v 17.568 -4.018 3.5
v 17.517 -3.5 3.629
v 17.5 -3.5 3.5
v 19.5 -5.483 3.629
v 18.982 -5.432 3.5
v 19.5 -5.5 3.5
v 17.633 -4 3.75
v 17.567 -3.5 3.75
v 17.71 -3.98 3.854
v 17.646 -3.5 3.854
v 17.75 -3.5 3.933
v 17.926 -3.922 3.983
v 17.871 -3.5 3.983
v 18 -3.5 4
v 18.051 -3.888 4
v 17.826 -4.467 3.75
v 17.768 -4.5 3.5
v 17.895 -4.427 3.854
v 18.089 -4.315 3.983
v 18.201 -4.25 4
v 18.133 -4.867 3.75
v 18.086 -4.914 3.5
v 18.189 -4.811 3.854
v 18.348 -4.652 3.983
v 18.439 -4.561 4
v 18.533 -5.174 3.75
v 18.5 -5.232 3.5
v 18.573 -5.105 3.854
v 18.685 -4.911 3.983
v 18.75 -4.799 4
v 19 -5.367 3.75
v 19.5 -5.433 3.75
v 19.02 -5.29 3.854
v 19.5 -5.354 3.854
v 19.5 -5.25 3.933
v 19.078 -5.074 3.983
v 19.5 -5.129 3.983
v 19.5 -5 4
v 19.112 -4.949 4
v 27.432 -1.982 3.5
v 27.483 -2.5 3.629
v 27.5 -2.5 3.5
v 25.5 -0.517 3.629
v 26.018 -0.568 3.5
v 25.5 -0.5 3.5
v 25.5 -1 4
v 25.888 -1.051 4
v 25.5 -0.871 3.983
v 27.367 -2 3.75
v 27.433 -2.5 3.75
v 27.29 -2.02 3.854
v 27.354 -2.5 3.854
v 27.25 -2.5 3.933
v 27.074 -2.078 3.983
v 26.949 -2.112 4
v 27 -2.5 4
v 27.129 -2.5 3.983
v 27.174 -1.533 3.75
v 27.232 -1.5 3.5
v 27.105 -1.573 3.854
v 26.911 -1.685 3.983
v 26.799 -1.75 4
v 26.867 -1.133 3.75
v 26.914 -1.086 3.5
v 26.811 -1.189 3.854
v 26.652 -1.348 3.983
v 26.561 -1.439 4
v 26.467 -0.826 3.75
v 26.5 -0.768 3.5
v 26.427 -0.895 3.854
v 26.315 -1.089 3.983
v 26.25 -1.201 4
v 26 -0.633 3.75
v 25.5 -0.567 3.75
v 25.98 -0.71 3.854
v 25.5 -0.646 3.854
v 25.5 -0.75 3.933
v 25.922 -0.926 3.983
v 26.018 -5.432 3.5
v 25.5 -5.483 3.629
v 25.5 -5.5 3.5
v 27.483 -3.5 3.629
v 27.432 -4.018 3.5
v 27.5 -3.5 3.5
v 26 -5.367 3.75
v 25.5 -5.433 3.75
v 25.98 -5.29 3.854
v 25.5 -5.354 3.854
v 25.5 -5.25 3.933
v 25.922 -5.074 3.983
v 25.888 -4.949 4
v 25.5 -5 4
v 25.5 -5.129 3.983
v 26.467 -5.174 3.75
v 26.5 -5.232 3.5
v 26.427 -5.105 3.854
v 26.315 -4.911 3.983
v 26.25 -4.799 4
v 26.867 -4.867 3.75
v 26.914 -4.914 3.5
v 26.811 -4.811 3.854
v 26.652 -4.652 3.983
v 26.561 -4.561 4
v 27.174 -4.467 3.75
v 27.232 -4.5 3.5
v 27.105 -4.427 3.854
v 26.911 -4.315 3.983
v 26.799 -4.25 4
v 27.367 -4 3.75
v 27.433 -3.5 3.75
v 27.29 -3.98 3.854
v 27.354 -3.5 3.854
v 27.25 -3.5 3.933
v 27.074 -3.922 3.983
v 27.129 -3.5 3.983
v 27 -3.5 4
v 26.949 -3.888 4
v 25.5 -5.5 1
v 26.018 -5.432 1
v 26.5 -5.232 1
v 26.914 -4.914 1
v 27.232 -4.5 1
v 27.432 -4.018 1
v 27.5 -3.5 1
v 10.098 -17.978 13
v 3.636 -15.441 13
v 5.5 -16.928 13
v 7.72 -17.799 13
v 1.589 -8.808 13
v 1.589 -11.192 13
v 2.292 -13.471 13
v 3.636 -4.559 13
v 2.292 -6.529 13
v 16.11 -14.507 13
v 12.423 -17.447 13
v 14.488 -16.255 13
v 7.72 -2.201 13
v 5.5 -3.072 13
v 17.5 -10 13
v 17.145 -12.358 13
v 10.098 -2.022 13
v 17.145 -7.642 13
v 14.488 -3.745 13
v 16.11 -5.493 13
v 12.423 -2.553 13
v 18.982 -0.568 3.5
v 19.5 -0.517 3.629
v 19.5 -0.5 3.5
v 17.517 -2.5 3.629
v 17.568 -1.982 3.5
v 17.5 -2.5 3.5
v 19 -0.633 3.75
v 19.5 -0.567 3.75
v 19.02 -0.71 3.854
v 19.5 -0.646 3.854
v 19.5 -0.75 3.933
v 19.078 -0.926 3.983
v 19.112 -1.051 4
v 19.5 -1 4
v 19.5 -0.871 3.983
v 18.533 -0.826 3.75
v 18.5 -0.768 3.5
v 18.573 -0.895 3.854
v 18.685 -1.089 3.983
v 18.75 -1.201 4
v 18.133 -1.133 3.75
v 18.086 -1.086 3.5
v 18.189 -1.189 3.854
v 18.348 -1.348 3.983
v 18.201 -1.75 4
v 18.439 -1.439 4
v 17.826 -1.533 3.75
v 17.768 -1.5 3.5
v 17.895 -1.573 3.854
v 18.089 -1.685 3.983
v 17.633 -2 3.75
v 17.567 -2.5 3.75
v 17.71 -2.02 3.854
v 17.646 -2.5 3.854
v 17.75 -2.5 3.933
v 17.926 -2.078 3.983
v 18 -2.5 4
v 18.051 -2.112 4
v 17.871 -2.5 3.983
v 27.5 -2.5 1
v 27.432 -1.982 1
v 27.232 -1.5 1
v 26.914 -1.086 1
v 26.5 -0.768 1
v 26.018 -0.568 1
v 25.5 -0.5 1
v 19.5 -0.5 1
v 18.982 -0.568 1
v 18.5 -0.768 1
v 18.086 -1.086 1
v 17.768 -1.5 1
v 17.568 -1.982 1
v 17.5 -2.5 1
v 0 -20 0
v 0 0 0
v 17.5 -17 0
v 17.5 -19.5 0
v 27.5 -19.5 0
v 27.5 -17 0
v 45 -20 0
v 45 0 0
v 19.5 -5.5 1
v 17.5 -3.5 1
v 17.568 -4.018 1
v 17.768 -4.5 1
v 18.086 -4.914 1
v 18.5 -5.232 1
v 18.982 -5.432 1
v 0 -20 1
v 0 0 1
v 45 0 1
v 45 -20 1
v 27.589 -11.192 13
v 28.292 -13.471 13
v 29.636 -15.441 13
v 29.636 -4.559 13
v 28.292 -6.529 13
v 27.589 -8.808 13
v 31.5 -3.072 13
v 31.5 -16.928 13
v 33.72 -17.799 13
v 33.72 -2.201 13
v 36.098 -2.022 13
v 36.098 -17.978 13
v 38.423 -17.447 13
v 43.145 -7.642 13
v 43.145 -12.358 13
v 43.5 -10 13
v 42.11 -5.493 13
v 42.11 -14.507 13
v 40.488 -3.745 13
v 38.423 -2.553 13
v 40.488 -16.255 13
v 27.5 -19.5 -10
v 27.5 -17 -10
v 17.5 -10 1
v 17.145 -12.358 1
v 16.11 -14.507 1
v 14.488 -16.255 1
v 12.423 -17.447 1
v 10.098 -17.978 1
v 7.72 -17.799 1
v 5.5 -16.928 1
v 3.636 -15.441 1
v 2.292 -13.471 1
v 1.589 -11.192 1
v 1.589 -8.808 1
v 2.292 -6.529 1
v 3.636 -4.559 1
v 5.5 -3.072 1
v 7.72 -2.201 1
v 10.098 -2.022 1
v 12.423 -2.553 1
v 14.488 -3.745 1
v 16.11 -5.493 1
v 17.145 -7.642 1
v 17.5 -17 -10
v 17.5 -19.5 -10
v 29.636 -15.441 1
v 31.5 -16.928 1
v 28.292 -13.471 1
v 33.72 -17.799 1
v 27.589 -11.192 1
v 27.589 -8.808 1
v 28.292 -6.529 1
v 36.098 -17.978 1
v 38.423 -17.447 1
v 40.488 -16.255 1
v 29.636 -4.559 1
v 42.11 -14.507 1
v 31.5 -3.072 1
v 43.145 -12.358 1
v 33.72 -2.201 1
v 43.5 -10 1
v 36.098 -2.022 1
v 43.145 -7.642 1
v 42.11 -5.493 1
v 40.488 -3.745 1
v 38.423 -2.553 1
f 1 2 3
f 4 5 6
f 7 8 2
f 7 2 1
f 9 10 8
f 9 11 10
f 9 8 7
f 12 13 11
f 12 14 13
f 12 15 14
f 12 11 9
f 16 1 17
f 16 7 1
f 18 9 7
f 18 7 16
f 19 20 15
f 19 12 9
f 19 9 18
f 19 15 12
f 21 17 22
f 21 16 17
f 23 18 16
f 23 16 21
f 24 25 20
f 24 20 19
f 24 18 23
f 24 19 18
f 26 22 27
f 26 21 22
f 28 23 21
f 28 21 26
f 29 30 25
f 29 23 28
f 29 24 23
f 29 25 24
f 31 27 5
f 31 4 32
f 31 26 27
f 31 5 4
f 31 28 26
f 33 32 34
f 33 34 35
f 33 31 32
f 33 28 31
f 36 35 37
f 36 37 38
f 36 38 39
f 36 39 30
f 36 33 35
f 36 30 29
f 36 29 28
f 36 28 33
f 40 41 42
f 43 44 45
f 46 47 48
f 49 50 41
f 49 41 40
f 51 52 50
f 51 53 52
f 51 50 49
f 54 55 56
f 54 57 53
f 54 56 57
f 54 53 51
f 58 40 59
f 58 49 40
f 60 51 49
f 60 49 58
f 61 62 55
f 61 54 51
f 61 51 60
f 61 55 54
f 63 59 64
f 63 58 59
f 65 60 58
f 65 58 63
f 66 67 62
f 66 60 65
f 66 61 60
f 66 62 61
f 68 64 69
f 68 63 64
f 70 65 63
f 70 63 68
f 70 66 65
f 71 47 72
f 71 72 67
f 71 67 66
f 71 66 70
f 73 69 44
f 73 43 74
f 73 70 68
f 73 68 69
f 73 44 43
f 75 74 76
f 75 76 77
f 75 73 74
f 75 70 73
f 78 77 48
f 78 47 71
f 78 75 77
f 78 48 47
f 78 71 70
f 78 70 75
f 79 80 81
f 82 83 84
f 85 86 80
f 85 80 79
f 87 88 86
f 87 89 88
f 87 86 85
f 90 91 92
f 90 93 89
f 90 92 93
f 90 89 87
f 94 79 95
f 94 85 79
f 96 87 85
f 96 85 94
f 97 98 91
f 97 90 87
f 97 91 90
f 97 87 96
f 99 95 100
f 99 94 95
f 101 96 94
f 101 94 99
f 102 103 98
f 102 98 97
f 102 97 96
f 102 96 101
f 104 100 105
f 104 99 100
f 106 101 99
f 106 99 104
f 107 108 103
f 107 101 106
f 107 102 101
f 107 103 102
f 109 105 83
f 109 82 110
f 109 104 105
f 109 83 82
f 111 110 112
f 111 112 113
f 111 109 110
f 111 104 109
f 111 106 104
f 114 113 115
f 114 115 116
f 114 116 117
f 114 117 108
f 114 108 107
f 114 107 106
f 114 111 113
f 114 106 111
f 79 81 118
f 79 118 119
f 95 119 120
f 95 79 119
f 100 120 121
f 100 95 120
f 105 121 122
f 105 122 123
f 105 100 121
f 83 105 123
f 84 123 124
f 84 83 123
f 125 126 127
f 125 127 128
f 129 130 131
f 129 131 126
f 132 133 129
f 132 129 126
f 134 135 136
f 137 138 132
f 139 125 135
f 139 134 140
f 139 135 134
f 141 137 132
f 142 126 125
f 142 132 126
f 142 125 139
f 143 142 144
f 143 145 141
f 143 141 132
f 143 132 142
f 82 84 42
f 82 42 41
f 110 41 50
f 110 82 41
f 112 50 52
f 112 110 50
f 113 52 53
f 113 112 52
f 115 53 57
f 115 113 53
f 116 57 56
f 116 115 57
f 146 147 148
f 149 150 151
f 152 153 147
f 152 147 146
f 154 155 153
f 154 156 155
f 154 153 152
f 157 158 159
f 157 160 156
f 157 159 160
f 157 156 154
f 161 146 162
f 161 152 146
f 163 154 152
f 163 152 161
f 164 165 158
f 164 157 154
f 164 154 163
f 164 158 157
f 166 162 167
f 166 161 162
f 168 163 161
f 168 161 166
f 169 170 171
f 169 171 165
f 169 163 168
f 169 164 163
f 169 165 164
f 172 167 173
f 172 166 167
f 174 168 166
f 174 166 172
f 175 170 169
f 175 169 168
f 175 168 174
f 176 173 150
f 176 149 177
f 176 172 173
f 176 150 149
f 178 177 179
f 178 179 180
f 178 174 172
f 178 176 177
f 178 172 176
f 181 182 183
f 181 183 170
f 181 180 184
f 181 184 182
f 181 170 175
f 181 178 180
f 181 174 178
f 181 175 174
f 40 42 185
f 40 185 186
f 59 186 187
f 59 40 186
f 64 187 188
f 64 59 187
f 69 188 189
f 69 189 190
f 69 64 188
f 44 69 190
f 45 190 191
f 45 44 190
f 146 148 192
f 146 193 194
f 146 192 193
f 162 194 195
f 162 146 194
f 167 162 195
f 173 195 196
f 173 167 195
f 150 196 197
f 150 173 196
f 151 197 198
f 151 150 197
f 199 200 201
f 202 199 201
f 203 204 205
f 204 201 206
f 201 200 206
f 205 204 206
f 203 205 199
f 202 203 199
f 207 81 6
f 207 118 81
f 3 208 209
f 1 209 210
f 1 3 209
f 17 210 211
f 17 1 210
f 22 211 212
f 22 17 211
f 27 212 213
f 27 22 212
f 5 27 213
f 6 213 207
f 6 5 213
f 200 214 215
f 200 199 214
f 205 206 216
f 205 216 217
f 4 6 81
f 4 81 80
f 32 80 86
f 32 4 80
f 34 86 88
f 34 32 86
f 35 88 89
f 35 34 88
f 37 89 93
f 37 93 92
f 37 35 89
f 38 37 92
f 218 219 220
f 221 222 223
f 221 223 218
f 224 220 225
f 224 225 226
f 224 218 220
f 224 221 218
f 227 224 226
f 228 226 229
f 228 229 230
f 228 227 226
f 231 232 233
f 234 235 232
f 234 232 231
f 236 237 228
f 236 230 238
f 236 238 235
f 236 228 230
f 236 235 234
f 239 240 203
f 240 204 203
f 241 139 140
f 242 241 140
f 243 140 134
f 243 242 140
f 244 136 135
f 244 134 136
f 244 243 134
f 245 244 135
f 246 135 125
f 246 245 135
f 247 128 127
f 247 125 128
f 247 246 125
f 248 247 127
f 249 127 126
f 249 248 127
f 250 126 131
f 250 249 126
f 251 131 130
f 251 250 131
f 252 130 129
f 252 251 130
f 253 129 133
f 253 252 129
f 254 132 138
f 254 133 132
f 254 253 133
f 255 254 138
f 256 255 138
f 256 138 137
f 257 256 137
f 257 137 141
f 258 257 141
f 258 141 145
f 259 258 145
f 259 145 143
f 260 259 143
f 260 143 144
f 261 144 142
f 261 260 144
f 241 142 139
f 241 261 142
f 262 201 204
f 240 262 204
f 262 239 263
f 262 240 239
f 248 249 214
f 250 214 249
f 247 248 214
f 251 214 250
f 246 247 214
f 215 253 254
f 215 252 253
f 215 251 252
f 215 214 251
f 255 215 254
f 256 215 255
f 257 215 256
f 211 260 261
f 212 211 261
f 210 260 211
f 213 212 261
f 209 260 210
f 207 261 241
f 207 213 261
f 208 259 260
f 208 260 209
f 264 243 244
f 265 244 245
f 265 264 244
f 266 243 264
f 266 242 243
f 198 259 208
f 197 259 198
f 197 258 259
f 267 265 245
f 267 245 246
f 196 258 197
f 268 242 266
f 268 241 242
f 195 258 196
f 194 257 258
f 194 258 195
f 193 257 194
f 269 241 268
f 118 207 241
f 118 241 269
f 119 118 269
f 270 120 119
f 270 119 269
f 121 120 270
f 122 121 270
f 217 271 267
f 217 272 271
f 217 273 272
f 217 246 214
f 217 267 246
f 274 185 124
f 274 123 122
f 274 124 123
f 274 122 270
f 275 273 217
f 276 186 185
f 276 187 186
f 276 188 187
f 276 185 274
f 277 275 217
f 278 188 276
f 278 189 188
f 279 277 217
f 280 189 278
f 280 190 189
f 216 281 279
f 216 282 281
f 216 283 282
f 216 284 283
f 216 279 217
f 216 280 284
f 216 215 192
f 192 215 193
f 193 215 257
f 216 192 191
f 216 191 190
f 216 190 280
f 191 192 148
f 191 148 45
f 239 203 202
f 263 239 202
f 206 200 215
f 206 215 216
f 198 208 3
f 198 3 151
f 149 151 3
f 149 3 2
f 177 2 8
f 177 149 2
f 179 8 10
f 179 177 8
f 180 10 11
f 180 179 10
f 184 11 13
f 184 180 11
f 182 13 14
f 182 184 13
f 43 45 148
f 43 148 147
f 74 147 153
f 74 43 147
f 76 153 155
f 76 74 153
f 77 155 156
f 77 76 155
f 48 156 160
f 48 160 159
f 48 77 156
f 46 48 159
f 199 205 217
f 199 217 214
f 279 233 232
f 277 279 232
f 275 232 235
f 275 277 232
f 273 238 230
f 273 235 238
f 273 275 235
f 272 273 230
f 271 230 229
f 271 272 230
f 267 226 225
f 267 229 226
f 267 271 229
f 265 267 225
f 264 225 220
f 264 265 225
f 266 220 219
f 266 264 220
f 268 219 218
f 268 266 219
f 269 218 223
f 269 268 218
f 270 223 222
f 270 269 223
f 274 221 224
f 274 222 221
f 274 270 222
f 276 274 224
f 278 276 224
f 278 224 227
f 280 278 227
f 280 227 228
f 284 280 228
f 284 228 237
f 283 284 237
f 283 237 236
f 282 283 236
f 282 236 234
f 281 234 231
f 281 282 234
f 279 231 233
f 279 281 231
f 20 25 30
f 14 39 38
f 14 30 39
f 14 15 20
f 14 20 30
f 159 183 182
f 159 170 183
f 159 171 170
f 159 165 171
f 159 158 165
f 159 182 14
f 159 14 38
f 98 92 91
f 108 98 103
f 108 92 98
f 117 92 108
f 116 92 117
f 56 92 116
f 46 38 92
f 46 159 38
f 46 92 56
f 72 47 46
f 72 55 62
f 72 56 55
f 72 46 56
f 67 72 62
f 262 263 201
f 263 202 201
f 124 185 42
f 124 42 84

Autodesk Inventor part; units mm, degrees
ref_plane "YZ Plane" through (0, 0, 0) normal (1, 0, 0) x (0, 1, 0)
ref_plane "XZ Plane" through (0, 0, 0) normal (0, 1, 0) x (-1, 0, 0)
ref_plane "XY Plane" through (0, 0, 0) normal (0, 0, 1) x (1, 0, 0)
sketch "Sketch1" plane through (0, 0, 0) normal (0, 0, 1) x (1, 0, 0)
  line L0 (0, 0) -> (45, 0)
  line L1 (45, 0) -> (45, -20)
  line L2 (45, -20) -> (0, -20)
  line L3 (0, -20) -> (0, 0)
  dimension "d0" = 45
  dimension "d1" = 20
extrude "Extrusion1" add sketch "Sketch1" along normal blind 1
sketch "Sketch2" plane through (0, 0, 1) normal (0, 0, 1) x (1, 0, 0)
  circle A0 centre (9.5, -10) radius 8
  circle A1 centre (35.5, -10) radius 8
  line L0 (0, -20) -> (45, -20) projected
  line L1 (0, 0) -> (0, -20) projected
  dimension "d4" = 16
  dimension "d5" = 16
  dimension "d6" = 26
  dimension "d7" = 10
  dimension "d8" = 9.5
extrude "Extrusion2" add sketch "Sketch2" along normal blind 12
sketch "Sketch3" plane through (0, 0, 1) normal (0, 0, 1) x (1, 0, 0)
  line L0 (17.5, -0.5) -> (27.5, -0.5)
  line L1 (27.5, -0.5) -> (27.5, -5.5)
  line L2 (27.5, -5.5) -> (17.5, -5.5)
  line L3 (17.5, -5.5) -> (17.5, -0.5)
  line L4 (0, 0) -> (0, -20) projected
  line L5 (45, 0) -> (0, 0) projected
  dimension "d11" = 10
  dimension "d12" = 5
  dimension "d13" = 17.5
  dimension "d14" = 0.5
extrude "Extrusion3" add sketch "Sketch3" along normal blind 3
fillet "Fillet1" radius 2 4 edges at (27.5, -0.5, 2.5) (27.5, -5.5, 2.5) (17.5, -0.5, 2.5) (17.5, -5.5, 2.5)
fillet "Fillet2" radius 0.5 8 edges at (17.5, -3, 4) (18.0858, -1.0858, 4) (22.5, -0.5, 4) (26.9142, -1.0858, 4) (27.5, -3, 4) (26.9142, -4.9142, 4) (22.5, -5.5, 4) (18.0858, -4.9142, 4)
sketch "Sketch4" plane through (0, 0, 0) normal (0, 0, -1) x (-1, 0, 0)
  point P0 (0, 0)
sketch "Sketch5" plane through (0, 0, 0) normal (0, 0, -1) x (-1, 0, 0)
  line L0 (0, -20) -> (-45, -20) projected
  line L1 (-27.5, -19.5) -> (-17.5, -19.5)
  line L2 (-17.5, -19.5) -> (-17.5, -17)
  line L3 (-17.5, -17) -> (-27.5, -17)
  line L4 (-27.5, -17) -> (-27.5, -19.5)
  line L5 (-45, -20) -> (-45, 0) projected
  point P0 (0, 0)
  point P1 (-17.5, -18.25)
  point P2 (-27.5, -18.25)
  point P3 (-17.5, -20)
  dimension "d20" = 10
  dimension "d21" = 17.5
  dimension "d24" = 0.5
  dimension "d25" = 2.5
extrude "Extrusion4" add sketch "Sketch5" along normal blind 10
properties part number "UltrasonicSensor"
